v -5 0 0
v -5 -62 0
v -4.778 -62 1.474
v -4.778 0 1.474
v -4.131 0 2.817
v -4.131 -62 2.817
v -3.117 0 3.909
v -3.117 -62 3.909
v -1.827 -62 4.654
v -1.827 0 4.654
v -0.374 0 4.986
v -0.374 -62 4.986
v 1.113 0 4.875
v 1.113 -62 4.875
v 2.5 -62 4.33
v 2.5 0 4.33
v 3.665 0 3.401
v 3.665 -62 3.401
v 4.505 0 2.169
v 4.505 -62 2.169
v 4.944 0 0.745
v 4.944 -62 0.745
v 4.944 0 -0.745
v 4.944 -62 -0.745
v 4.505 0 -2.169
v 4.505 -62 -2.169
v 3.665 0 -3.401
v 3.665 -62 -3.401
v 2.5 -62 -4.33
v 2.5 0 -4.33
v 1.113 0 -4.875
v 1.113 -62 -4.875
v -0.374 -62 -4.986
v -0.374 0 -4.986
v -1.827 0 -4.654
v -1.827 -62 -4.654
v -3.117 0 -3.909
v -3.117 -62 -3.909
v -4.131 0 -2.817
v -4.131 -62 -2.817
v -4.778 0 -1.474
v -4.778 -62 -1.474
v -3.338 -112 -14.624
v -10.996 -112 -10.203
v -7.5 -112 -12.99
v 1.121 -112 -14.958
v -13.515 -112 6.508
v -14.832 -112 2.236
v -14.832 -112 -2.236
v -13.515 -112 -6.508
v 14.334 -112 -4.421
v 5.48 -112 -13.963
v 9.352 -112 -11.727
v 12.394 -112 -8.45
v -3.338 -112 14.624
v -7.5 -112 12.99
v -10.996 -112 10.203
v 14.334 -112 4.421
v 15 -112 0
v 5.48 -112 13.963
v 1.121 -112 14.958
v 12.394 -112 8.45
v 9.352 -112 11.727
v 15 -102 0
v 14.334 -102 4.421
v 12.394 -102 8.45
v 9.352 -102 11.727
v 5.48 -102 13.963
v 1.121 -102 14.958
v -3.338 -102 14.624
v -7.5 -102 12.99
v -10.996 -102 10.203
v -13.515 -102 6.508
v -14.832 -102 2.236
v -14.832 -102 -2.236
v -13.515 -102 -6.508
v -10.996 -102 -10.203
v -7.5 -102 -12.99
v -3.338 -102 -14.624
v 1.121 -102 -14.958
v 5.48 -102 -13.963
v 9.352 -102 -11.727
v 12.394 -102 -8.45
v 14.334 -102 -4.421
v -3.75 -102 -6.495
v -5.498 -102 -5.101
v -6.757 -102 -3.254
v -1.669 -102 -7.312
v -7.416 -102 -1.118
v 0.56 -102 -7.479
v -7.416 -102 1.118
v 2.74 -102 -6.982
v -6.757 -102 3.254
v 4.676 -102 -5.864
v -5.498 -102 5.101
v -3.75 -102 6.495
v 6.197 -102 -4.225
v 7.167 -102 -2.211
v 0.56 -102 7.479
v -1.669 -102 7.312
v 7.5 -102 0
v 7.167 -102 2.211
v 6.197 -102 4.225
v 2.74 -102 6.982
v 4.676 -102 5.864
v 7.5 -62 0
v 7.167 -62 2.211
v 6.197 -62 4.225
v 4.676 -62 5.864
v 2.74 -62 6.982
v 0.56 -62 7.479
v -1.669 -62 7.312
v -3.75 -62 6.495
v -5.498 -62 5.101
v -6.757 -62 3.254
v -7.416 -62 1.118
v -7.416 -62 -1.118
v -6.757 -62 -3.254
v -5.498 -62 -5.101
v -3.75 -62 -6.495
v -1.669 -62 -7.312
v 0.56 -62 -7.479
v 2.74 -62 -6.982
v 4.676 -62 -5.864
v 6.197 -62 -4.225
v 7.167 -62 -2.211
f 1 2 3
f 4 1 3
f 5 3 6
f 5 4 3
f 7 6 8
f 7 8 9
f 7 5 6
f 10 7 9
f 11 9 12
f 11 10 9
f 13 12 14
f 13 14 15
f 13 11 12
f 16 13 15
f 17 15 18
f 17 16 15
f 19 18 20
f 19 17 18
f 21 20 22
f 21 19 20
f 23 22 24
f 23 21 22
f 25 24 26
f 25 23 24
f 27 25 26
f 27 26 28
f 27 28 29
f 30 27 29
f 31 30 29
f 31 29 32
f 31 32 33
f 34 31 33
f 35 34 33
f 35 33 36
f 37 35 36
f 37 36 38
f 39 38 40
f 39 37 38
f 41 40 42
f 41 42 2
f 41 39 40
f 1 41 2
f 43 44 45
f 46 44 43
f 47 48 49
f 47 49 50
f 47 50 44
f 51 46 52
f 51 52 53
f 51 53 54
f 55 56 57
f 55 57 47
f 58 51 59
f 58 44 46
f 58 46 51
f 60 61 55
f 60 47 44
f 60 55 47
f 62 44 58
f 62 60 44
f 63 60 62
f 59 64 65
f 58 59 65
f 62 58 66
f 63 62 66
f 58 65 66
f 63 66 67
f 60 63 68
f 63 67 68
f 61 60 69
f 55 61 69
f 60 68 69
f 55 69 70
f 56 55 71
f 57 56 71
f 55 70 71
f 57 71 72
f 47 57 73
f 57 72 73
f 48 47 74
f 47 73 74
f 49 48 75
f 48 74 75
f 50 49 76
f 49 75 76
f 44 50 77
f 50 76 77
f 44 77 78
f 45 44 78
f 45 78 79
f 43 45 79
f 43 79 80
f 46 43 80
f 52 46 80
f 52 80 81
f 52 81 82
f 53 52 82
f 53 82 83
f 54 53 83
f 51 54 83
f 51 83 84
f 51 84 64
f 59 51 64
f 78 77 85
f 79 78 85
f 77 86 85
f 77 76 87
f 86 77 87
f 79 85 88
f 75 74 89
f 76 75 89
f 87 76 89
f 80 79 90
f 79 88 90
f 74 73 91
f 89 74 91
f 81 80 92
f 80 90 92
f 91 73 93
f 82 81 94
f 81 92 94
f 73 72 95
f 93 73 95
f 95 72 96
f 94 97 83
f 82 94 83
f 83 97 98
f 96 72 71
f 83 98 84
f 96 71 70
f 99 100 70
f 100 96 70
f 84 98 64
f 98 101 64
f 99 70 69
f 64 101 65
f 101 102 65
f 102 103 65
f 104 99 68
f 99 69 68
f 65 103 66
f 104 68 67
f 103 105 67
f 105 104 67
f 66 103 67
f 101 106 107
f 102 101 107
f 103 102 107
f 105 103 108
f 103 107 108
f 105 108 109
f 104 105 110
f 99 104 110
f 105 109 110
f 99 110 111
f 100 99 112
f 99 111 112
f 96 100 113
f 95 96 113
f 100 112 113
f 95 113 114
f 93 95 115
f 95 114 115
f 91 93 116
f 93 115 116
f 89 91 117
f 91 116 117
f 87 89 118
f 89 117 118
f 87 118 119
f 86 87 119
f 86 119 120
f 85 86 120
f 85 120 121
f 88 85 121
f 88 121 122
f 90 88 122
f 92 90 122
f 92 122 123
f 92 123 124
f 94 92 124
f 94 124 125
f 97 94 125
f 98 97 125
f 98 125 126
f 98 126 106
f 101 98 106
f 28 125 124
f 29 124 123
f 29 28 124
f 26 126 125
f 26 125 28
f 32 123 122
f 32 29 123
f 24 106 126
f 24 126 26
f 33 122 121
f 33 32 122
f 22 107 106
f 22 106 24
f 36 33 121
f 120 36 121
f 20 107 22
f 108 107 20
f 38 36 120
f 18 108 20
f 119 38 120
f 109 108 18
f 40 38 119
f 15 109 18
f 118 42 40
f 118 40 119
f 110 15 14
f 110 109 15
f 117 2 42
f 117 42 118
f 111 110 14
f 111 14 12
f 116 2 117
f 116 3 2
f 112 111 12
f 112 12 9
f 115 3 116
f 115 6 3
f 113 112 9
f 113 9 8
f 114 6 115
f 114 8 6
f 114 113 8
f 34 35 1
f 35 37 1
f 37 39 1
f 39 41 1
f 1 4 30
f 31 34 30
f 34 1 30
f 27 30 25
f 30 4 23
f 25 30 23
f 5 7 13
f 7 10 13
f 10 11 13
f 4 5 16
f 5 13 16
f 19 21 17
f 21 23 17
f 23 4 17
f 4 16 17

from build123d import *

# Parameters (mm, degrees)
F0_R     = 15
F1_DEPTH = 112
F2_R     = 15
F2_R_2   = 7.5
F3_DEPTH = 102
F4_R     = 7.5
F4_R_2   = 5
F5_DEPTH = 62


with BuildPart() as f1:
    # F0 (on Front) → F1 (new body)
    with BuildSketch(Plane.XZ):
        Circle(F0_R)
    extrude(amount=F1_DEPTH)

    # F2 (on Front) → F3 (cut)
    with BuildSketch(Plane.XZ):
        Circle(F2_R)
        Circle(F2_R_2, mode=Mode.SUBTRACT)
    extrude(amount=F3_DEPTH, mode=Mode.SUBTRACT)

    # F4 (on face) → F5 (cut)
    with BuildSketch(Plane(origin=(0, 0, 0), x_dir=(-1, 0, 0), z_dir=(0, 1, 0))):
        Circle(F4_R)
        Circle(F4_R_2, mode=Mode.SUBTRACT)
    extrude(amount=-F5_DEPTH, mode=Mode.SUBTRACT)


solid = f1.part
